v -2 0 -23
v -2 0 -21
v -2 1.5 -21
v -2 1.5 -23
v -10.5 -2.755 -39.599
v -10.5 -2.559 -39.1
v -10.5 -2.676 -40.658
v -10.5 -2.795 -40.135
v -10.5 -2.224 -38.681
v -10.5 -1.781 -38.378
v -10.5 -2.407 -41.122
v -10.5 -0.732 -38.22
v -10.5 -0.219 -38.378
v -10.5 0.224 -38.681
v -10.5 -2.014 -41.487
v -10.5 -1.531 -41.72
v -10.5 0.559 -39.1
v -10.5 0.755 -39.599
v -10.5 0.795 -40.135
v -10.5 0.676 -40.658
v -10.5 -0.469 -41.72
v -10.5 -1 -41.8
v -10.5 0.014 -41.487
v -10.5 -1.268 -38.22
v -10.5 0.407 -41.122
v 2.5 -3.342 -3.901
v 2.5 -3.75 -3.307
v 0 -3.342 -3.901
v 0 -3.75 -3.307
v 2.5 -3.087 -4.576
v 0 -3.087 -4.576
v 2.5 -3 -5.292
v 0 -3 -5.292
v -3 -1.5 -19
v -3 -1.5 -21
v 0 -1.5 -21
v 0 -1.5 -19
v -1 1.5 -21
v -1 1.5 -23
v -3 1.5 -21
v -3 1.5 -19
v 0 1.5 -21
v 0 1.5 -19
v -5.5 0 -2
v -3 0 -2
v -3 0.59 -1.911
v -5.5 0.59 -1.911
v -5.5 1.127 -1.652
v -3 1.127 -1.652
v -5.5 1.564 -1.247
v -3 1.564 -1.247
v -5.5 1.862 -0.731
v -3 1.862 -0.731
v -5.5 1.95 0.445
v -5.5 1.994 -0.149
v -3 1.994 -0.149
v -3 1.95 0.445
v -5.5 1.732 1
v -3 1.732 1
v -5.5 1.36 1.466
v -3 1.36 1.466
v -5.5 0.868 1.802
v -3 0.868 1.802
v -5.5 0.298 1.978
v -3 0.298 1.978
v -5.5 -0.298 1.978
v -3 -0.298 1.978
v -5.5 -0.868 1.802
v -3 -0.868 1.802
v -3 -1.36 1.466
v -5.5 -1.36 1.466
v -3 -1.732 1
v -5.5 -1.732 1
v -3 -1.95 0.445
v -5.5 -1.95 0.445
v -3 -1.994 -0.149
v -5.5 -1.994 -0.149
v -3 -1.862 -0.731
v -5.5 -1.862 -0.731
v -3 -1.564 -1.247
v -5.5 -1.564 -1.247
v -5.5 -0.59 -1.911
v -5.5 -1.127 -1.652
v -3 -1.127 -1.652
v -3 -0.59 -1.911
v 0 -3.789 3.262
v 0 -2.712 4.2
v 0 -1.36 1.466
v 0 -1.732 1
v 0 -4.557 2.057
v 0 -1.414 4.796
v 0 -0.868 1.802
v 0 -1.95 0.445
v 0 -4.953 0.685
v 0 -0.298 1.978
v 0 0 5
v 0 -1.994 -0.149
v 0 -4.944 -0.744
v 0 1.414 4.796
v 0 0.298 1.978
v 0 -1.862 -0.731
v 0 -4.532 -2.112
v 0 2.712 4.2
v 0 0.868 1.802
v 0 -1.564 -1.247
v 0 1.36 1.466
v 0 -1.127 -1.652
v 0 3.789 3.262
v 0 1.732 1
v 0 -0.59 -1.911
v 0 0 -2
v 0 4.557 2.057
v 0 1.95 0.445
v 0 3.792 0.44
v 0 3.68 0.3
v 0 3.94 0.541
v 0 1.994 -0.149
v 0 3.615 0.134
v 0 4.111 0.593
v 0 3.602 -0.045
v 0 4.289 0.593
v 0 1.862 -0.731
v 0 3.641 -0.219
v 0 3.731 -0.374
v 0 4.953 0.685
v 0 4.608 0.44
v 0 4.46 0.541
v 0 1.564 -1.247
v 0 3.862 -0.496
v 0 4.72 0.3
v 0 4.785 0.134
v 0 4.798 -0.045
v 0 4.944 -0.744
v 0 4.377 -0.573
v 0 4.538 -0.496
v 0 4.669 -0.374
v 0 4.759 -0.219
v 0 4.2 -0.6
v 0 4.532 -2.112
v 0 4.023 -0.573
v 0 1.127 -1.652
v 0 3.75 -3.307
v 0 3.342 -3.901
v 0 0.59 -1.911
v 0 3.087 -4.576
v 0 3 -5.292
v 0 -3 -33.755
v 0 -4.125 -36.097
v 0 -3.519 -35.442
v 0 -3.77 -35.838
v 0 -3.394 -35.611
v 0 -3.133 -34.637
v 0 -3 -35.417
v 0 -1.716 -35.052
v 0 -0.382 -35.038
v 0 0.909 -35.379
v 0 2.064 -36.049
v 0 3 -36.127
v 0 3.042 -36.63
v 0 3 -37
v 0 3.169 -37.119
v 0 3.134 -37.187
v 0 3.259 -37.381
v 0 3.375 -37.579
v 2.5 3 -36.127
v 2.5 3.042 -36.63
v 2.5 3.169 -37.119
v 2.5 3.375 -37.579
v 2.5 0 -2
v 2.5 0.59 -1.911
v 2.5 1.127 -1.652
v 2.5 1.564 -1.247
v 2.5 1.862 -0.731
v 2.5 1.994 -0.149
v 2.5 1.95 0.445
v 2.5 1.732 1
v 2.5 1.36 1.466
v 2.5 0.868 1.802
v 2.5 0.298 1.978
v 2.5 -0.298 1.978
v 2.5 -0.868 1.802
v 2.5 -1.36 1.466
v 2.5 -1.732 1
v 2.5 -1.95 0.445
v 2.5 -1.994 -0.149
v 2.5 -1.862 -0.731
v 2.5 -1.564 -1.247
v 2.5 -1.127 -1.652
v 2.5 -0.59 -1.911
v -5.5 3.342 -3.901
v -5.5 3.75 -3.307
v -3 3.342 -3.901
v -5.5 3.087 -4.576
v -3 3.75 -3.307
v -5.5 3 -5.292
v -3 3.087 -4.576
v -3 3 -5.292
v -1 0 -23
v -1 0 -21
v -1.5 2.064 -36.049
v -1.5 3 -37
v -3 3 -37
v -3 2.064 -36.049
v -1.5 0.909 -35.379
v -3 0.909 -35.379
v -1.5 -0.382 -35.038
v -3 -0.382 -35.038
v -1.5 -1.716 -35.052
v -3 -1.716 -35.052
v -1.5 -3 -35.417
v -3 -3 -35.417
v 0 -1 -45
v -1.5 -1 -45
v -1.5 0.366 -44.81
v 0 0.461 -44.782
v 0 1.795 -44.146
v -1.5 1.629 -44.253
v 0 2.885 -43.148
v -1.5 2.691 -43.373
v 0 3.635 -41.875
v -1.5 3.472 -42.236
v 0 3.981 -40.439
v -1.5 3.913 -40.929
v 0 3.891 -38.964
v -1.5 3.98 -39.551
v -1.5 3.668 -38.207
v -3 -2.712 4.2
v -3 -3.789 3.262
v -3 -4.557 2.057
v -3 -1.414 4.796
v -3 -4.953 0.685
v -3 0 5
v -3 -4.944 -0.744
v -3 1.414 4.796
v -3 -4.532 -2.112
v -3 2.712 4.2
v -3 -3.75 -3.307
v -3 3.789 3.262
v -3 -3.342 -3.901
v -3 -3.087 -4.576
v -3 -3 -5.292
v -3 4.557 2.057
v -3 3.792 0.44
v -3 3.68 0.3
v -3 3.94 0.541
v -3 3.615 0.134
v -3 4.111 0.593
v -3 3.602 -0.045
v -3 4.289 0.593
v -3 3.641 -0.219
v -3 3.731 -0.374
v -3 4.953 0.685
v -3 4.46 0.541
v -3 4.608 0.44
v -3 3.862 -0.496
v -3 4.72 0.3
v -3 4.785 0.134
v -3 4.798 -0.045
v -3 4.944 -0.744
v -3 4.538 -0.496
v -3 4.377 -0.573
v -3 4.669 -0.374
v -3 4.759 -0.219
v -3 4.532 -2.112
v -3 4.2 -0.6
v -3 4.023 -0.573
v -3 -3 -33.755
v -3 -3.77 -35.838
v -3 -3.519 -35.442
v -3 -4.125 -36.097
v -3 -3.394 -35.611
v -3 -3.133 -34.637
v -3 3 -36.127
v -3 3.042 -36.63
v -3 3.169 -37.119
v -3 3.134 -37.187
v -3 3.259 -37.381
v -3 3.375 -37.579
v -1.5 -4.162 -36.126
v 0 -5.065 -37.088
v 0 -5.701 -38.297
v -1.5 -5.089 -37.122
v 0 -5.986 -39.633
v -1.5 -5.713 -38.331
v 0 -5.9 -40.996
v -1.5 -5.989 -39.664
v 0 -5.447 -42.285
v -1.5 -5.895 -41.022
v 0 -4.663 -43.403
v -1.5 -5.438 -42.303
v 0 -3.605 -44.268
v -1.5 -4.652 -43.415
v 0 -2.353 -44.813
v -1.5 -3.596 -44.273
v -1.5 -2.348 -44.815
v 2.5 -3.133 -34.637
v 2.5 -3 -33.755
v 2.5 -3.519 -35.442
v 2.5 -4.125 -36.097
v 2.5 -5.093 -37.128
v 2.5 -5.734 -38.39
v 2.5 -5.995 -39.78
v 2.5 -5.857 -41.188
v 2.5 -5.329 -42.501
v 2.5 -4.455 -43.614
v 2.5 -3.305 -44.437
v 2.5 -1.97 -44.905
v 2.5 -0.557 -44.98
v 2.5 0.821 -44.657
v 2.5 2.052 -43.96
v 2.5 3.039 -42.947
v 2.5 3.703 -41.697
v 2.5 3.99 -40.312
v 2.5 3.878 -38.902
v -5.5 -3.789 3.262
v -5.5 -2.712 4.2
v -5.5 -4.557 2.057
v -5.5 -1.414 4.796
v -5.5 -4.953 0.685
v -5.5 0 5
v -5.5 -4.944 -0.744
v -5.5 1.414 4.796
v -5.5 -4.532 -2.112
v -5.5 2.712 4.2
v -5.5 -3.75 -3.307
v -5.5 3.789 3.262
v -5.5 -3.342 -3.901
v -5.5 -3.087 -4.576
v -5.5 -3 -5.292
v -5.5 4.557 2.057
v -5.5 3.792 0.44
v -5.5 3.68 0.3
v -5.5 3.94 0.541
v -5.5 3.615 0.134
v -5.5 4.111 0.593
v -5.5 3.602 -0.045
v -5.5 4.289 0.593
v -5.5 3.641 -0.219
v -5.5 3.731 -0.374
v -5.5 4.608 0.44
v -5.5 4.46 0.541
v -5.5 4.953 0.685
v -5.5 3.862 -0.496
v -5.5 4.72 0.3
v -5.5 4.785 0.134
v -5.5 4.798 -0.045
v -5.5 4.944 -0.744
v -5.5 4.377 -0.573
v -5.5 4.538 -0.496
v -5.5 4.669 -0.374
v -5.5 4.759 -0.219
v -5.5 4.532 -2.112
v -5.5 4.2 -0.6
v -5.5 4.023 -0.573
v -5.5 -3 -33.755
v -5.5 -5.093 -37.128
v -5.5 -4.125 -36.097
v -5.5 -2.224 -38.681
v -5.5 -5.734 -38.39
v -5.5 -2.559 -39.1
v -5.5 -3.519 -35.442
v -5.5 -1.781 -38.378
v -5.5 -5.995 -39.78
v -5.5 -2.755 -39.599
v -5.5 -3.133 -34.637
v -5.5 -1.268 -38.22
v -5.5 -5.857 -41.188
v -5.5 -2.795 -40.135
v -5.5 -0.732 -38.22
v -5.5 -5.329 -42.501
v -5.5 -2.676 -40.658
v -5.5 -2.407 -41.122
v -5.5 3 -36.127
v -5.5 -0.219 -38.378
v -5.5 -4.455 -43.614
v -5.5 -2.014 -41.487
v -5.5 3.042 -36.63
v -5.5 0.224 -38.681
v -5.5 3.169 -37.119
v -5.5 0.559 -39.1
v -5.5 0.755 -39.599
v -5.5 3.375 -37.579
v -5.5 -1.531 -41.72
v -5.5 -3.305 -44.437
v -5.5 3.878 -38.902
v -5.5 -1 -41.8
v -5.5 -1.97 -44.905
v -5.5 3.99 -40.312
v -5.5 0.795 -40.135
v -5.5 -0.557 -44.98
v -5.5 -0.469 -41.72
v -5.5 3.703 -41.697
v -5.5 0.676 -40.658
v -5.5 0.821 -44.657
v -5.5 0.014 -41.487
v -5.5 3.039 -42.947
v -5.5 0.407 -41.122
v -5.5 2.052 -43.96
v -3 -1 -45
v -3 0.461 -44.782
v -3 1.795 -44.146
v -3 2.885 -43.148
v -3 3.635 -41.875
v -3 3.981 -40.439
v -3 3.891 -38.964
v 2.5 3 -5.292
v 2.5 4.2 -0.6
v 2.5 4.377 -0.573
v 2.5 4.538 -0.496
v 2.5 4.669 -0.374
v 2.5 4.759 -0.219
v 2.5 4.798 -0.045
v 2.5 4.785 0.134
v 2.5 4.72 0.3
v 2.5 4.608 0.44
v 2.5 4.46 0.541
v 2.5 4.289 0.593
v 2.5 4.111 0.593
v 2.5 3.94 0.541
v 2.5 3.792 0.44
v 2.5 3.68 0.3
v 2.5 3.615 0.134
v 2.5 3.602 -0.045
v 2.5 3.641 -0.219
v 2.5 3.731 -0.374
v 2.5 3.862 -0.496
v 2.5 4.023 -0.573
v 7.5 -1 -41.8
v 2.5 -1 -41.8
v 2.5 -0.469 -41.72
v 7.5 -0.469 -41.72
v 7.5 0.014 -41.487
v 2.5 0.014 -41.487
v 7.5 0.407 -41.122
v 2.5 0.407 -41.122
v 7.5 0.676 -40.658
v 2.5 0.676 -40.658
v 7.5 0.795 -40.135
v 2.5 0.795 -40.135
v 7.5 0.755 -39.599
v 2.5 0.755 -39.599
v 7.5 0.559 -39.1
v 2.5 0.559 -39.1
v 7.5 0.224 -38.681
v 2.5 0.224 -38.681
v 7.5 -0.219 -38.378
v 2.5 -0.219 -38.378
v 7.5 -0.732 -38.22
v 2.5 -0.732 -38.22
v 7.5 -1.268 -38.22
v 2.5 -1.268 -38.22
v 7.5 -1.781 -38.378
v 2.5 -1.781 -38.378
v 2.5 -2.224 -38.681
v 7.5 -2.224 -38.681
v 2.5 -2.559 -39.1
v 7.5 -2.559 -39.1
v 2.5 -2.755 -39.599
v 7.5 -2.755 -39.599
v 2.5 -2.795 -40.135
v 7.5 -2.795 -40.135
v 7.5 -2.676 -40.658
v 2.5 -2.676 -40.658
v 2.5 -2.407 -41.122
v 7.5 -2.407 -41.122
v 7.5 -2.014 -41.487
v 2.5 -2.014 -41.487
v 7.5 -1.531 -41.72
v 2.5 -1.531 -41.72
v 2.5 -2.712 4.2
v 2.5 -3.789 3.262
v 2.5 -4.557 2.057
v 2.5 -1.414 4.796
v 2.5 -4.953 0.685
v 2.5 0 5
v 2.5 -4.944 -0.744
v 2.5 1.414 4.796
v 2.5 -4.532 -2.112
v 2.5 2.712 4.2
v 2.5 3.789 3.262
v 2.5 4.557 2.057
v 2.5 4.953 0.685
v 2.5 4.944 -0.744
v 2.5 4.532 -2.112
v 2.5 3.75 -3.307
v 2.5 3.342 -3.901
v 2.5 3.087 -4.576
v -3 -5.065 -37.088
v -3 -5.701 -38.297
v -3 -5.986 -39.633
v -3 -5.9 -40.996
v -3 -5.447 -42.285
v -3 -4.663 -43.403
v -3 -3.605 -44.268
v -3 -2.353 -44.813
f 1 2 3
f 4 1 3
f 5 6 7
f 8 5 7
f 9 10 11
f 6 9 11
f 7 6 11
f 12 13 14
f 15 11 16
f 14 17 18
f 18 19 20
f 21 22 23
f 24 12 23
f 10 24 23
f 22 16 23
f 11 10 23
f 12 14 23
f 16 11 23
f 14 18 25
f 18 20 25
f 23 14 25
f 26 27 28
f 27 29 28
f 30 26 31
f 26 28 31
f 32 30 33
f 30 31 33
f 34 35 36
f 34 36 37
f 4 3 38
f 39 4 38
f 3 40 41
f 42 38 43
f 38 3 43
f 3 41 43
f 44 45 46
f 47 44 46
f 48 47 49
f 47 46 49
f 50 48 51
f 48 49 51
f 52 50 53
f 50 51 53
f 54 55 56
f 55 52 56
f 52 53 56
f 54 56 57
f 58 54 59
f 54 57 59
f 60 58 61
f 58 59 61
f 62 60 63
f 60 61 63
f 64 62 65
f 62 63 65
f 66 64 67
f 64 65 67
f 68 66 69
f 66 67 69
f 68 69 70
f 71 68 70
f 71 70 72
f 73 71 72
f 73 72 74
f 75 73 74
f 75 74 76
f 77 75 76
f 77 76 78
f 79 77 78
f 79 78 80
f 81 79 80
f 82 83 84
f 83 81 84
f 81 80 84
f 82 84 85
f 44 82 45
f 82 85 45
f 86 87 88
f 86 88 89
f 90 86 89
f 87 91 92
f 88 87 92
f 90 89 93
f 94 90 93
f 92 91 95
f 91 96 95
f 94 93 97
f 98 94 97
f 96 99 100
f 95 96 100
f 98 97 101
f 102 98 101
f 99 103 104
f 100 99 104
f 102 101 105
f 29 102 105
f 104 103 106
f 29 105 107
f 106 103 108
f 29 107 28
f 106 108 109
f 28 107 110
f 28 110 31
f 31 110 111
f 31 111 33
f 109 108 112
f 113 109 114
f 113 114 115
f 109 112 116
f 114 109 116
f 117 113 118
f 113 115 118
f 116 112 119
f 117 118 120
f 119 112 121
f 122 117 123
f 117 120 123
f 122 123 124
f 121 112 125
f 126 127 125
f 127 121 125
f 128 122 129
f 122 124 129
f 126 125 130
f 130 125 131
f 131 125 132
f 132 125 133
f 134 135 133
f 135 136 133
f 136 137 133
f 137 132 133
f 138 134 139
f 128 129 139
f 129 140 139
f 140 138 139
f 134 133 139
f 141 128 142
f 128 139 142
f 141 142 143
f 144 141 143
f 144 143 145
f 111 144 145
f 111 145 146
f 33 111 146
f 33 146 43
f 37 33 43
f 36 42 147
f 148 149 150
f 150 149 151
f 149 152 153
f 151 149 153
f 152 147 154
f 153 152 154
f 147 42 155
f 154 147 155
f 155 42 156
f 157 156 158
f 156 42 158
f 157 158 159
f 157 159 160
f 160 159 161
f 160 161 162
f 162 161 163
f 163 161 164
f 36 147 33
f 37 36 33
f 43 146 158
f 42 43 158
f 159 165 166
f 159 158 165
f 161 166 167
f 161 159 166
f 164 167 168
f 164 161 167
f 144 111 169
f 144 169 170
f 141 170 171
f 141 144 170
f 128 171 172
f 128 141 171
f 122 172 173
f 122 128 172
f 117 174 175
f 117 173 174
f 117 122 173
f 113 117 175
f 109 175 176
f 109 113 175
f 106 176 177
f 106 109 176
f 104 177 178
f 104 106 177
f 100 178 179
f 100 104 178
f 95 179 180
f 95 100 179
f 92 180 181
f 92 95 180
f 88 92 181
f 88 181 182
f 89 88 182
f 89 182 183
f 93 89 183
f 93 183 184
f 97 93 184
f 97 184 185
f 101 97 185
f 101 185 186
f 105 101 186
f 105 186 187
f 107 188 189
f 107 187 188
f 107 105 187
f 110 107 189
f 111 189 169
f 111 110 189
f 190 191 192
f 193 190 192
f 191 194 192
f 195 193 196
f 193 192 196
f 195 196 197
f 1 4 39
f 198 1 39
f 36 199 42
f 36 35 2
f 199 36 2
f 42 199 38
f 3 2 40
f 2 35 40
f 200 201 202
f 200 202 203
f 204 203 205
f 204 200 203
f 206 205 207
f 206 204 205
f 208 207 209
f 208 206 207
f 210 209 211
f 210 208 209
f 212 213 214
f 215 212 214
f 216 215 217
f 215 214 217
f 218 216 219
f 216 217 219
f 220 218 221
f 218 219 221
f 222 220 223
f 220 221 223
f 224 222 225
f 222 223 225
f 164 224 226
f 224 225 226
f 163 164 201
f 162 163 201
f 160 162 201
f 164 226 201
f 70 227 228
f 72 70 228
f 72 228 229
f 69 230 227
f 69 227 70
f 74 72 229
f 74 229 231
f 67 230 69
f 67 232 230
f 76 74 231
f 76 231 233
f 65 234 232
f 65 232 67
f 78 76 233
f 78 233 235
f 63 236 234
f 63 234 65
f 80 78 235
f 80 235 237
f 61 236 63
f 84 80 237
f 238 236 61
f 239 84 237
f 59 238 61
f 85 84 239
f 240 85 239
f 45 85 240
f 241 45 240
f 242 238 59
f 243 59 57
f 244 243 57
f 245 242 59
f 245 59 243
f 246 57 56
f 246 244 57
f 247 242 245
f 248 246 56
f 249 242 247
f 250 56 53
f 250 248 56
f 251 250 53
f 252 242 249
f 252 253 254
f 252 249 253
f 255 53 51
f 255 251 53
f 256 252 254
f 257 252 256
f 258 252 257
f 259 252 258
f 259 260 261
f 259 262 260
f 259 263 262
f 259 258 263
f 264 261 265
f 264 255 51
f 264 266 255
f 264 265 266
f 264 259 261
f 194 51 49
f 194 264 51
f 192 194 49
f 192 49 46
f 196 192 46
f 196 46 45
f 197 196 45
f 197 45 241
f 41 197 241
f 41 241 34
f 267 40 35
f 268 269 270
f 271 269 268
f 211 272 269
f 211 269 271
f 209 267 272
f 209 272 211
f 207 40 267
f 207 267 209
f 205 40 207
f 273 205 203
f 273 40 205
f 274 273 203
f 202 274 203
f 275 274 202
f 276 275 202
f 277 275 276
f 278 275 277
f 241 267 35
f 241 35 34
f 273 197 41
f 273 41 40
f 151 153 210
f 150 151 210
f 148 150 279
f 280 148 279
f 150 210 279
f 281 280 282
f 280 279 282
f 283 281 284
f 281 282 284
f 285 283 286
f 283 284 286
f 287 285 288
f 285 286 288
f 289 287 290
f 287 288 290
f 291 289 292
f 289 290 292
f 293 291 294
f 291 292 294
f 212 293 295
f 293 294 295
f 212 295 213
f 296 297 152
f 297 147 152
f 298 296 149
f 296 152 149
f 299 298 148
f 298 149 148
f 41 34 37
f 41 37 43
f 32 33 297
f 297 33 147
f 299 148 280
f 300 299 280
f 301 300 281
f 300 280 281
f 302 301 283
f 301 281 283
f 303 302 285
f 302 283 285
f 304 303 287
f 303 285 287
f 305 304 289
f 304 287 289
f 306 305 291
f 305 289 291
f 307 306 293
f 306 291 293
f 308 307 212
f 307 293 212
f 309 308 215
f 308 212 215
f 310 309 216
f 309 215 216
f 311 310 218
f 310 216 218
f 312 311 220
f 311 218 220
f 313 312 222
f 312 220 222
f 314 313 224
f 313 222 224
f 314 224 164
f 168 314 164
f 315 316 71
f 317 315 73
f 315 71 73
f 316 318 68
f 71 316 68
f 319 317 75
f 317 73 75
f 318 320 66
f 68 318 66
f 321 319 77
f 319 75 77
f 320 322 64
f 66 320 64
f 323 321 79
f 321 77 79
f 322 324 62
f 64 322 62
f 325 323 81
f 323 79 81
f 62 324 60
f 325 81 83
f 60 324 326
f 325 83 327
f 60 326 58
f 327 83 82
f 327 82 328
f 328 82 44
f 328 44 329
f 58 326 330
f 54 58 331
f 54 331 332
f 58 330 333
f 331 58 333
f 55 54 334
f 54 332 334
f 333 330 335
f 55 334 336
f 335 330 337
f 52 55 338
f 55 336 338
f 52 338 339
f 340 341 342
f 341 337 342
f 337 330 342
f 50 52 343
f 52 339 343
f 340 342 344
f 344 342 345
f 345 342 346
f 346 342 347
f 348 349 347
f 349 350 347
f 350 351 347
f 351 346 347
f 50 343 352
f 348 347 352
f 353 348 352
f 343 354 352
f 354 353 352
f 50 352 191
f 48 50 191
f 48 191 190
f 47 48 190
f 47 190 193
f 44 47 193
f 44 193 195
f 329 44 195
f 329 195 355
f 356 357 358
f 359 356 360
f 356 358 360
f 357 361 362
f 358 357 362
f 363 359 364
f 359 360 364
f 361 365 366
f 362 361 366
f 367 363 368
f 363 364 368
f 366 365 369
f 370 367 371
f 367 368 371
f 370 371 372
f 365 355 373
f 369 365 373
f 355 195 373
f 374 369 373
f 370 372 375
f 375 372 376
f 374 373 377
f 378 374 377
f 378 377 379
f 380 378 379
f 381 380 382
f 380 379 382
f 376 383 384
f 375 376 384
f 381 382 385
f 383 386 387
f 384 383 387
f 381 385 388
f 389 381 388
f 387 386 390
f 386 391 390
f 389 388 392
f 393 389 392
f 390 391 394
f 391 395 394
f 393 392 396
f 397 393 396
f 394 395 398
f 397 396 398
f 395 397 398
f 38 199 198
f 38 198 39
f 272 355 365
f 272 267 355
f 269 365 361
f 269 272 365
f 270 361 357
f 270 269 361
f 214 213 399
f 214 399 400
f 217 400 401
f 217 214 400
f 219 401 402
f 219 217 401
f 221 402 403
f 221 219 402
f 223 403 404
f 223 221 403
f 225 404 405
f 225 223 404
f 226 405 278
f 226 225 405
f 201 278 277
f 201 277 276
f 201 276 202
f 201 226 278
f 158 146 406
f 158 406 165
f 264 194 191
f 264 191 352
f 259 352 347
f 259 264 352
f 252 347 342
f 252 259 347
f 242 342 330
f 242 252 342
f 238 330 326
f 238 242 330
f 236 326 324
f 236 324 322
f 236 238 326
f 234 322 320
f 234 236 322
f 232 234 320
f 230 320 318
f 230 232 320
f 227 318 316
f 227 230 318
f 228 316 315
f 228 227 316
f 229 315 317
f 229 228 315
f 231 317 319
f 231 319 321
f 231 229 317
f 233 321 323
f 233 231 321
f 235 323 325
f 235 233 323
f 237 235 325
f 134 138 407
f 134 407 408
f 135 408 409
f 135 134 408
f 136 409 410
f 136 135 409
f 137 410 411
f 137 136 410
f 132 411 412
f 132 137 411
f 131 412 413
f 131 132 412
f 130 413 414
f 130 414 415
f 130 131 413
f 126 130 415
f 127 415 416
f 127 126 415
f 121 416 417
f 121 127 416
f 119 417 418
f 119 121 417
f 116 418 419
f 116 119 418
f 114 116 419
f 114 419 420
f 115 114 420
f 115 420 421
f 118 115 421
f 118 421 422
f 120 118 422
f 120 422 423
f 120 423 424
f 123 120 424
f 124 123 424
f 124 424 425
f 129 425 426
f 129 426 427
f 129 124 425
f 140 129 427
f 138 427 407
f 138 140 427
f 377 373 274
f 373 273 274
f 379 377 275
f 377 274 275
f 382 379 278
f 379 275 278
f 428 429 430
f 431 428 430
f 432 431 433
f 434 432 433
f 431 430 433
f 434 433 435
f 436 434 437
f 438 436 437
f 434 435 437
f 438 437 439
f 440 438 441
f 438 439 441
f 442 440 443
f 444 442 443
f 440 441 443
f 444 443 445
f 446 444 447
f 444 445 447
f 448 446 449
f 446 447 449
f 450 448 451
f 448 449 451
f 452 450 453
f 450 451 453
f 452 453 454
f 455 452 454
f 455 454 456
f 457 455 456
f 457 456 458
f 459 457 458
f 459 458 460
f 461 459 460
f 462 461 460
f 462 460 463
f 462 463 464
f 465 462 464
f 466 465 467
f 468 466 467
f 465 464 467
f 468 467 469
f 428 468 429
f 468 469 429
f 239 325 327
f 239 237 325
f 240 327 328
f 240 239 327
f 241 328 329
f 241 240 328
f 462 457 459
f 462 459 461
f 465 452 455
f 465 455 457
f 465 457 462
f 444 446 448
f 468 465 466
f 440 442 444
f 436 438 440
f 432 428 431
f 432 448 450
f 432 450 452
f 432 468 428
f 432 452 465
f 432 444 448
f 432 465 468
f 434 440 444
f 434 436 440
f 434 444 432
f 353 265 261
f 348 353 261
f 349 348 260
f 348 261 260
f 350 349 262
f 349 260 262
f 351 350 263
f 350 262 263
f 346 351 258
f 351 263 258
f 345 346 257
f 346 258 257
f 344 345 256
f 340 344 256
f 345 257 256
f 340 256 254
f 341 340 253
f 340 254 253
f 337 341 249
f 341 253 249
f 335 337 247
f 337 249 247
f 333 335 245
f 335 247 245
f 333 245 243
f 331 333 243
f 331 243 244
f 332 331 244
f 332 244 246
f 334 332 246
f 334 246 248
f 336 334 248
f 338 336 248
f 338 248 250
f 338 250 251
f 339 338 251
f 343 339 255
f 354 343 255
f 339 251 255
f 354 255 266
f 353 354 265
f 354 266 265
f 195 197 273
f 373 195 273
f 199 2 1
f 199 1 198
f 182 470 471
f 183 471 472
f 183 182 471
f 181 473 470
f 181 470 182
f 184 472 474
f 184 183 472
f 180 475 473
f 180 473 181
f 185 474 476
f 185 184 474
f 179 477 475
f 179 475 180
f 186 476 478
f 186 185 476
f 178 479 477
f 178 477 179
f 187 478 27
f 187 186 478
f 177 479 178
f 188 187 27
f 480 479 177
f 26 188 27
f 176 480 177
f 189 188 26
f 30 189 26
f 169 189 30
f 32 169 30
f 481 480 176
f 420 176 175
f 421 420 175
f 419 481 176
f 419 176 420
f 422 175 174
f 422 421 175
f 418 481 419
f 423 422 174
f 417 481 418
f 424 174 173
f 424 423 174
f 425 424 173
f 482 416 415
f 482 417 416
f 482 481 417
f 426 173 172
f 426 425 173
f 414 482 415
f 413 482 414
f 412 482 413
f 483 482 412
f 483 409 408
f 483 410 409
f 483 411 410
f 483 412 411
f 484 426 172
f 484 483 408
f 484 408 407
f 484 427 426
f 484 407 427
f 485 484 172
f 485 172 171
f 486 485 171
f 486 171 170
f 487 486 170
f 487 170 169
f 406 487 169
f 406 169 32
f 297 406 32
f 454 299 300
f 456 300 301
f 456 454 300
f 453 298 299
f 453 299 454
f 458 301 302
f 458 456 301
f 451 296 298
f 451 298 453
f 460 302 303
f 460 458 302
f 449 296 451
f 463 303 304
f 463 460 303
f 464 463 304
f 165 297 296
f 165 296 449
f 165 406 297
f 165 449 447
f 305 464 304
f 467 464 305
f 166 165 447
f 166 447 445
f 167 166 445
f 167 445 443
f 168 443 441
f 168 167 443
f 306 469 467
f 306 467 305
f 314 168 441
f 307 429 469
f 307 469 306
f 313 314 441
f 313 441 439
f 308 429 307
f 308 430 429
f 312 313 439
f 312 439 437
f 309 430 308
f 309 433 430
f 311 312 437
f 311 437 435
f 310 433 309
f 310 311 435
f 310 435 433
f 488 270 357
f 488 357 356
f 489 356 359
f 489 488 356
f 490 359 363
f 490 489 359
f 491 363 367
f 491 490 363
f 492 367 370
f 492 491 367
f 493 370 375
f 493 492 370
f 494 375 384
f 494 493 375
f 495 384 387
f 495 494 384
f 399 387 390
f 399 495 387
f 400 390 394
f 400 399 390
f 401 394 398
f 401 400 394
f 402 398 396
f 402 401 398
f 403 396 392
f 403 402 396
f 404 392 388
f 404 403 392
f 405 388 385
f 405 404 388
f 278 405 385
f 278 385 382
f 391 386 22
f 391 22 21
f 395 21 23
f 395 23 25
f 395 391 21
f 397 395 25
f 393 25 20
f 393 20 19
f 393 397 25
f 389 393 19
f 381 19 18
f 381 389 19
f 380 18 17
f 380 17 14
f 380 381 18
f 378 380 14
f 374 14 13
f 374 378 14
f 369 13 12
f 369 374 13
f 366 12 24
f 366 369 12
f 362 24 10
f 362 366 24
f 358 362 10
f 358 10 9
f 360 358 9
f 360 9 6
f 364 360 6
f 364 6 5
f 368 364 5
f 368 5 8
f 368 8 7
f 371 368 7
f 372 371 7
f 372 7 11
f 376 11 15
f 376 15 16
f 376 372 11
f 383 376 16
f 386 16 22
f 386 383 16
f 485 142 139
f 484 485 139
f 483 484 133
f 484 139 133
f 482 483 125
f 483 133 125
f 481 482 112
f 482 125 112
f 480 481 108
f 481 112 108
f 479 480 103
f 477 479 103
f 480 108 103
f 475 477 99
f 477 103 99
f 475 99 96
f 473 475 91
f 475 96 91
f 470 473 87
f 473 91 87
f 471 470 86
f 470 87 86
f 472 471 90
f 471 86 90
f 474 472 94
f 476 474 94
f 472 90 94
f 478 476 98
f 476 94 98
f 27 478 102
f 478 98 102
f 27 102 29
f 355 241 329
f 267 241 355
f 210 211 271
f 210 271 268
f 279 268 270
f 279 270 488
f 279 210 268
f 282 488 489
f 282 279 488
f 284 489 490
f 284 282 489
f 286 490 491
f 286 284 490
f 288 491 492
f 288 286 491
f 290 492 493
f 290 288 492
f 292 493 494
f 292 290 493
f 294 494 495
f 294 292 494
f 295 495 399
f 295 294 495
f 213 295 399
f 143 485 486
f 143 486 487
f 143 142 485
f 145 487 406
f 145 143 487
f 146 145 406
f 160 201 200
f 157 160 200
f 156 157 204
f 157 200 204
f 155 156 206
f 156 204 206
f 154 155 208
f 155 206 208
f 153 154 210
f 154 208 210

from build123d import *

# Parameters (mm, degrees)
SKETCH_1_R                  = 5
SKETCH_1_R_2                = 0.6
SKETCH_1_W                  = 40
SKETCH_1_H                  = 6
EXTRUDE_1_DEPTH             = 2.5
CUT_EXTRUDE_2_DEPTH         = 46.467021015
CUT_EXTRUDE_2_DEPTH_BACK    = 46.467021015
SKETCH_1_3_R                = 2
FILLET_1_R                  = 3
EXTRUDE_START               = -1.5
SKETCH_1_4_R                = 5
SKETCH_1_4_R_2              = 2
EXTRUDE_2_DEPTH             = 1.5
SKETCH_2_R                  = 1.8
EXTRUDE_4_DEPTH             = 5
EXTRUDE_5_REACH             = 48.014
SKETCH_1_5_R                = 2
EXTRUDE_5_DIRECTION_2_REACH = 48.014
SKETCH_3_W                  = 2
SKETCH_3_H                  = 3
EXTRUDE_8_DEPTH             = 1.5
SKETCH_4_W                  = 0.5
SKETCH_4_H                  = 1.5
EXTRUDE_9_DEPTH             = 2


with BuildPart() as part:
    # 草图1 → 凸台-拉伸1 (new body)
    # profile 1 of 3: a face of its own
    with BuildSketch(Plane(origin=(0, 0, 0), x_dir=(0, 0, -1), z_dir=(1, 0, 0))):
        Circle(SKETCH_1_R)
        with Locations((0, 4.2)):
            Circle(SKETCH_1_R_2, mode=Mode.SUBTRACT)
    # profile 2 of 3: a face of its own
    with BuildSketch(Plane(origin=(0, 0, 0), x_dir=(0, 0, -1), z_dir=(1, 0, 0))):
        with Locations((40, -1)):
            Circle(SKETCH_1_R)
    # profile 3 of 3: a face of its own
    with BuildSketch(Plane(origin=(0, 0, 0), x_dir=(0, 0, -1), z_dir=(1, 0, 0))):
        with Locations((20, 0)):
            Rectangle(SKETCH_1_W, SKETCH_1_H)
    extrude(amount=EXTRUDE_1_DEPTH)

    # 草图1<3> → 切除-拉伸2 (cut, two sides: drawn at the far end of the back side and taken through both)
    with BuildSketch(Plane(origin=(0, 0, 0), x_dir=(0, 0, -1), z_dir=(1, 0, 0)).offset(-CUT_EXTRUDE_2_DEPTH_BACK)):
        Circle(SKETCH_1_3_R)
        with Locations((40, -1)):
            Circle(SKETCH_1_3_R)
    extrude(amount=CUT_EXTRUDE_2_DEPTH + CUT_EXTRUDE_2_DEPTH_BACK, mode=Mode.SUBTRACT)

    # 圆角1
    fillet_1_edges = [part.edges().sort_by_distance(p)[0] for p in [
        (1.25, -3, -4),
        (1.25, -3, -35.417424305),
        (1.25, 3, -37),
        (1.25, 3, -4),
    ]]
    fillet(fillet_1_edges, radius=FILLET_1_R)

    # 草图1<4> → 凸台-拉伸2 (add)
    with BuildSketch(Plane(origin=(0, 0, 0), x_dir=(0, 0, -1), z_dir=(1, 0, 0)).offset(EXTRUDE_START)):
        with Locations((40, -1)):
            Circle(SKETCH_1_4_R)
        with Locations((40, -1)):
            Circle(SKETCH_1_4_R_2, mode=Mode.SUBTRACT)
    extrude(amount=EXTRUDE_2_DEPTH)

    # 凸台-拉伸5: up to this face of the body (flat: up to its plane)
    extrude_5_end = Plane(part.part.faces().sort_by_distance((2.5, -0.21352009, -20.113168079))[0])
    # 草图1<5> → 凸台-拉伸5 (add, up to the picked face)
    with BuildSketch(Plane(origin=(0, 0, 0), x_dir=(0, 0, -1), z_dir=(1, 0, 0)), mode=Mode.PRIVATE) as extrude_5_sk1:
        with Locations((40, -1)):
            Circle(SKETCH_1_5_R)
    extrude_5_tool1 = split(extrude(extrude_5_sk1.sketch, amount=EXTRUDE_5_REACH, mode=Mode.PRIVATE), bisect_by=extrude_5_end, keep=Keep.BOTH, mode=Mode.PRIVATE)


with BuildPart() as body_2:
    # 草图2 → 凸台-拉伸4 (new body)
    with BuildSketch(Plane(origin=(2.5, 0, 0), x_dir=(0, 0, -1), z_dir=(1, 0, 0))):
        with Locations((40, -1)):
            Circle(SKETCH_2_R)
    extrude(amount=EXTRUDE_4_DEPTH)


with BuildPart() as part_1:
    add(part.part)

    add(body_2.part)  # 凸台-拉伸5 merges body 2
    add(extrude_5_tool1.solids().sort_by(Axis((0, -1, -40), (1, 0, 0)))[0])

    # 凸台-拉伸5 direction 2: up to this face of the body (flat: up to its plane)
    extrude_5_direction_2_end = Plane(part_1.part.faces().sort_by_distance((-1.5, -1, -35.141421356))[0])
    # 草图1<5> → 凸台-拉伸5 direction 2 (add, up to the picked face)
    with BuildSketch(Plane(origin=(0, 0, 0), x_dir=(0, 0, -1), z_dir=(1, 0, 0)), mode=Mode.PRIVATE) as extrude_5_direction_2_sk1:
        with Locations((40, -1)):
            Circle(SKETCH_1_5_R)
    extrude_5_direction_2_tool1 = split(extrude(extrude_5_direction_2_sk1.sketch, amount=-EXTRUDE_5_DIRECTION_2_REACH, mode=Mode.PRIVATE), bisect_by=extrude_5_direction_2_end, keep=Keep.BOTH, mode=Mode.PRIVATE)
    add(extrude_5_direction_2_tool1.solids().sort_by(Axis((0, -1, -40), (-1, 0, 0)))[0])

    # 草图3 → 凸台-拉伸8 (add)
    with BuildSketch(Plane.ZY):
        with Locations((-20, 0)):
            Rectangle(SKETCH_3_W, SKETCH_3_H)
    extrude(amount=EXTRUDE_8_DEPTH)

    # 草图4 → 凸台-拉伸9 (add)
    with BuildSketch(Plane(origin=(0, 0, -21), x_dir=(-1, 0, 0), z_dir=(0, 0, -1))):
        with Locations((1.25, 0.75)):
            Rectangle(SKETCH_4_W, SKETCH_4_H)
    extrude(amount=EXTRUDE_9_DEPTH)

    # 镜向3: part across plane


with BuildPart() as part_2:
    add(part_1.part)
    add(part_1.part.mirror(Plane.ZY.offset(1.5)))


solid = part_2.part
